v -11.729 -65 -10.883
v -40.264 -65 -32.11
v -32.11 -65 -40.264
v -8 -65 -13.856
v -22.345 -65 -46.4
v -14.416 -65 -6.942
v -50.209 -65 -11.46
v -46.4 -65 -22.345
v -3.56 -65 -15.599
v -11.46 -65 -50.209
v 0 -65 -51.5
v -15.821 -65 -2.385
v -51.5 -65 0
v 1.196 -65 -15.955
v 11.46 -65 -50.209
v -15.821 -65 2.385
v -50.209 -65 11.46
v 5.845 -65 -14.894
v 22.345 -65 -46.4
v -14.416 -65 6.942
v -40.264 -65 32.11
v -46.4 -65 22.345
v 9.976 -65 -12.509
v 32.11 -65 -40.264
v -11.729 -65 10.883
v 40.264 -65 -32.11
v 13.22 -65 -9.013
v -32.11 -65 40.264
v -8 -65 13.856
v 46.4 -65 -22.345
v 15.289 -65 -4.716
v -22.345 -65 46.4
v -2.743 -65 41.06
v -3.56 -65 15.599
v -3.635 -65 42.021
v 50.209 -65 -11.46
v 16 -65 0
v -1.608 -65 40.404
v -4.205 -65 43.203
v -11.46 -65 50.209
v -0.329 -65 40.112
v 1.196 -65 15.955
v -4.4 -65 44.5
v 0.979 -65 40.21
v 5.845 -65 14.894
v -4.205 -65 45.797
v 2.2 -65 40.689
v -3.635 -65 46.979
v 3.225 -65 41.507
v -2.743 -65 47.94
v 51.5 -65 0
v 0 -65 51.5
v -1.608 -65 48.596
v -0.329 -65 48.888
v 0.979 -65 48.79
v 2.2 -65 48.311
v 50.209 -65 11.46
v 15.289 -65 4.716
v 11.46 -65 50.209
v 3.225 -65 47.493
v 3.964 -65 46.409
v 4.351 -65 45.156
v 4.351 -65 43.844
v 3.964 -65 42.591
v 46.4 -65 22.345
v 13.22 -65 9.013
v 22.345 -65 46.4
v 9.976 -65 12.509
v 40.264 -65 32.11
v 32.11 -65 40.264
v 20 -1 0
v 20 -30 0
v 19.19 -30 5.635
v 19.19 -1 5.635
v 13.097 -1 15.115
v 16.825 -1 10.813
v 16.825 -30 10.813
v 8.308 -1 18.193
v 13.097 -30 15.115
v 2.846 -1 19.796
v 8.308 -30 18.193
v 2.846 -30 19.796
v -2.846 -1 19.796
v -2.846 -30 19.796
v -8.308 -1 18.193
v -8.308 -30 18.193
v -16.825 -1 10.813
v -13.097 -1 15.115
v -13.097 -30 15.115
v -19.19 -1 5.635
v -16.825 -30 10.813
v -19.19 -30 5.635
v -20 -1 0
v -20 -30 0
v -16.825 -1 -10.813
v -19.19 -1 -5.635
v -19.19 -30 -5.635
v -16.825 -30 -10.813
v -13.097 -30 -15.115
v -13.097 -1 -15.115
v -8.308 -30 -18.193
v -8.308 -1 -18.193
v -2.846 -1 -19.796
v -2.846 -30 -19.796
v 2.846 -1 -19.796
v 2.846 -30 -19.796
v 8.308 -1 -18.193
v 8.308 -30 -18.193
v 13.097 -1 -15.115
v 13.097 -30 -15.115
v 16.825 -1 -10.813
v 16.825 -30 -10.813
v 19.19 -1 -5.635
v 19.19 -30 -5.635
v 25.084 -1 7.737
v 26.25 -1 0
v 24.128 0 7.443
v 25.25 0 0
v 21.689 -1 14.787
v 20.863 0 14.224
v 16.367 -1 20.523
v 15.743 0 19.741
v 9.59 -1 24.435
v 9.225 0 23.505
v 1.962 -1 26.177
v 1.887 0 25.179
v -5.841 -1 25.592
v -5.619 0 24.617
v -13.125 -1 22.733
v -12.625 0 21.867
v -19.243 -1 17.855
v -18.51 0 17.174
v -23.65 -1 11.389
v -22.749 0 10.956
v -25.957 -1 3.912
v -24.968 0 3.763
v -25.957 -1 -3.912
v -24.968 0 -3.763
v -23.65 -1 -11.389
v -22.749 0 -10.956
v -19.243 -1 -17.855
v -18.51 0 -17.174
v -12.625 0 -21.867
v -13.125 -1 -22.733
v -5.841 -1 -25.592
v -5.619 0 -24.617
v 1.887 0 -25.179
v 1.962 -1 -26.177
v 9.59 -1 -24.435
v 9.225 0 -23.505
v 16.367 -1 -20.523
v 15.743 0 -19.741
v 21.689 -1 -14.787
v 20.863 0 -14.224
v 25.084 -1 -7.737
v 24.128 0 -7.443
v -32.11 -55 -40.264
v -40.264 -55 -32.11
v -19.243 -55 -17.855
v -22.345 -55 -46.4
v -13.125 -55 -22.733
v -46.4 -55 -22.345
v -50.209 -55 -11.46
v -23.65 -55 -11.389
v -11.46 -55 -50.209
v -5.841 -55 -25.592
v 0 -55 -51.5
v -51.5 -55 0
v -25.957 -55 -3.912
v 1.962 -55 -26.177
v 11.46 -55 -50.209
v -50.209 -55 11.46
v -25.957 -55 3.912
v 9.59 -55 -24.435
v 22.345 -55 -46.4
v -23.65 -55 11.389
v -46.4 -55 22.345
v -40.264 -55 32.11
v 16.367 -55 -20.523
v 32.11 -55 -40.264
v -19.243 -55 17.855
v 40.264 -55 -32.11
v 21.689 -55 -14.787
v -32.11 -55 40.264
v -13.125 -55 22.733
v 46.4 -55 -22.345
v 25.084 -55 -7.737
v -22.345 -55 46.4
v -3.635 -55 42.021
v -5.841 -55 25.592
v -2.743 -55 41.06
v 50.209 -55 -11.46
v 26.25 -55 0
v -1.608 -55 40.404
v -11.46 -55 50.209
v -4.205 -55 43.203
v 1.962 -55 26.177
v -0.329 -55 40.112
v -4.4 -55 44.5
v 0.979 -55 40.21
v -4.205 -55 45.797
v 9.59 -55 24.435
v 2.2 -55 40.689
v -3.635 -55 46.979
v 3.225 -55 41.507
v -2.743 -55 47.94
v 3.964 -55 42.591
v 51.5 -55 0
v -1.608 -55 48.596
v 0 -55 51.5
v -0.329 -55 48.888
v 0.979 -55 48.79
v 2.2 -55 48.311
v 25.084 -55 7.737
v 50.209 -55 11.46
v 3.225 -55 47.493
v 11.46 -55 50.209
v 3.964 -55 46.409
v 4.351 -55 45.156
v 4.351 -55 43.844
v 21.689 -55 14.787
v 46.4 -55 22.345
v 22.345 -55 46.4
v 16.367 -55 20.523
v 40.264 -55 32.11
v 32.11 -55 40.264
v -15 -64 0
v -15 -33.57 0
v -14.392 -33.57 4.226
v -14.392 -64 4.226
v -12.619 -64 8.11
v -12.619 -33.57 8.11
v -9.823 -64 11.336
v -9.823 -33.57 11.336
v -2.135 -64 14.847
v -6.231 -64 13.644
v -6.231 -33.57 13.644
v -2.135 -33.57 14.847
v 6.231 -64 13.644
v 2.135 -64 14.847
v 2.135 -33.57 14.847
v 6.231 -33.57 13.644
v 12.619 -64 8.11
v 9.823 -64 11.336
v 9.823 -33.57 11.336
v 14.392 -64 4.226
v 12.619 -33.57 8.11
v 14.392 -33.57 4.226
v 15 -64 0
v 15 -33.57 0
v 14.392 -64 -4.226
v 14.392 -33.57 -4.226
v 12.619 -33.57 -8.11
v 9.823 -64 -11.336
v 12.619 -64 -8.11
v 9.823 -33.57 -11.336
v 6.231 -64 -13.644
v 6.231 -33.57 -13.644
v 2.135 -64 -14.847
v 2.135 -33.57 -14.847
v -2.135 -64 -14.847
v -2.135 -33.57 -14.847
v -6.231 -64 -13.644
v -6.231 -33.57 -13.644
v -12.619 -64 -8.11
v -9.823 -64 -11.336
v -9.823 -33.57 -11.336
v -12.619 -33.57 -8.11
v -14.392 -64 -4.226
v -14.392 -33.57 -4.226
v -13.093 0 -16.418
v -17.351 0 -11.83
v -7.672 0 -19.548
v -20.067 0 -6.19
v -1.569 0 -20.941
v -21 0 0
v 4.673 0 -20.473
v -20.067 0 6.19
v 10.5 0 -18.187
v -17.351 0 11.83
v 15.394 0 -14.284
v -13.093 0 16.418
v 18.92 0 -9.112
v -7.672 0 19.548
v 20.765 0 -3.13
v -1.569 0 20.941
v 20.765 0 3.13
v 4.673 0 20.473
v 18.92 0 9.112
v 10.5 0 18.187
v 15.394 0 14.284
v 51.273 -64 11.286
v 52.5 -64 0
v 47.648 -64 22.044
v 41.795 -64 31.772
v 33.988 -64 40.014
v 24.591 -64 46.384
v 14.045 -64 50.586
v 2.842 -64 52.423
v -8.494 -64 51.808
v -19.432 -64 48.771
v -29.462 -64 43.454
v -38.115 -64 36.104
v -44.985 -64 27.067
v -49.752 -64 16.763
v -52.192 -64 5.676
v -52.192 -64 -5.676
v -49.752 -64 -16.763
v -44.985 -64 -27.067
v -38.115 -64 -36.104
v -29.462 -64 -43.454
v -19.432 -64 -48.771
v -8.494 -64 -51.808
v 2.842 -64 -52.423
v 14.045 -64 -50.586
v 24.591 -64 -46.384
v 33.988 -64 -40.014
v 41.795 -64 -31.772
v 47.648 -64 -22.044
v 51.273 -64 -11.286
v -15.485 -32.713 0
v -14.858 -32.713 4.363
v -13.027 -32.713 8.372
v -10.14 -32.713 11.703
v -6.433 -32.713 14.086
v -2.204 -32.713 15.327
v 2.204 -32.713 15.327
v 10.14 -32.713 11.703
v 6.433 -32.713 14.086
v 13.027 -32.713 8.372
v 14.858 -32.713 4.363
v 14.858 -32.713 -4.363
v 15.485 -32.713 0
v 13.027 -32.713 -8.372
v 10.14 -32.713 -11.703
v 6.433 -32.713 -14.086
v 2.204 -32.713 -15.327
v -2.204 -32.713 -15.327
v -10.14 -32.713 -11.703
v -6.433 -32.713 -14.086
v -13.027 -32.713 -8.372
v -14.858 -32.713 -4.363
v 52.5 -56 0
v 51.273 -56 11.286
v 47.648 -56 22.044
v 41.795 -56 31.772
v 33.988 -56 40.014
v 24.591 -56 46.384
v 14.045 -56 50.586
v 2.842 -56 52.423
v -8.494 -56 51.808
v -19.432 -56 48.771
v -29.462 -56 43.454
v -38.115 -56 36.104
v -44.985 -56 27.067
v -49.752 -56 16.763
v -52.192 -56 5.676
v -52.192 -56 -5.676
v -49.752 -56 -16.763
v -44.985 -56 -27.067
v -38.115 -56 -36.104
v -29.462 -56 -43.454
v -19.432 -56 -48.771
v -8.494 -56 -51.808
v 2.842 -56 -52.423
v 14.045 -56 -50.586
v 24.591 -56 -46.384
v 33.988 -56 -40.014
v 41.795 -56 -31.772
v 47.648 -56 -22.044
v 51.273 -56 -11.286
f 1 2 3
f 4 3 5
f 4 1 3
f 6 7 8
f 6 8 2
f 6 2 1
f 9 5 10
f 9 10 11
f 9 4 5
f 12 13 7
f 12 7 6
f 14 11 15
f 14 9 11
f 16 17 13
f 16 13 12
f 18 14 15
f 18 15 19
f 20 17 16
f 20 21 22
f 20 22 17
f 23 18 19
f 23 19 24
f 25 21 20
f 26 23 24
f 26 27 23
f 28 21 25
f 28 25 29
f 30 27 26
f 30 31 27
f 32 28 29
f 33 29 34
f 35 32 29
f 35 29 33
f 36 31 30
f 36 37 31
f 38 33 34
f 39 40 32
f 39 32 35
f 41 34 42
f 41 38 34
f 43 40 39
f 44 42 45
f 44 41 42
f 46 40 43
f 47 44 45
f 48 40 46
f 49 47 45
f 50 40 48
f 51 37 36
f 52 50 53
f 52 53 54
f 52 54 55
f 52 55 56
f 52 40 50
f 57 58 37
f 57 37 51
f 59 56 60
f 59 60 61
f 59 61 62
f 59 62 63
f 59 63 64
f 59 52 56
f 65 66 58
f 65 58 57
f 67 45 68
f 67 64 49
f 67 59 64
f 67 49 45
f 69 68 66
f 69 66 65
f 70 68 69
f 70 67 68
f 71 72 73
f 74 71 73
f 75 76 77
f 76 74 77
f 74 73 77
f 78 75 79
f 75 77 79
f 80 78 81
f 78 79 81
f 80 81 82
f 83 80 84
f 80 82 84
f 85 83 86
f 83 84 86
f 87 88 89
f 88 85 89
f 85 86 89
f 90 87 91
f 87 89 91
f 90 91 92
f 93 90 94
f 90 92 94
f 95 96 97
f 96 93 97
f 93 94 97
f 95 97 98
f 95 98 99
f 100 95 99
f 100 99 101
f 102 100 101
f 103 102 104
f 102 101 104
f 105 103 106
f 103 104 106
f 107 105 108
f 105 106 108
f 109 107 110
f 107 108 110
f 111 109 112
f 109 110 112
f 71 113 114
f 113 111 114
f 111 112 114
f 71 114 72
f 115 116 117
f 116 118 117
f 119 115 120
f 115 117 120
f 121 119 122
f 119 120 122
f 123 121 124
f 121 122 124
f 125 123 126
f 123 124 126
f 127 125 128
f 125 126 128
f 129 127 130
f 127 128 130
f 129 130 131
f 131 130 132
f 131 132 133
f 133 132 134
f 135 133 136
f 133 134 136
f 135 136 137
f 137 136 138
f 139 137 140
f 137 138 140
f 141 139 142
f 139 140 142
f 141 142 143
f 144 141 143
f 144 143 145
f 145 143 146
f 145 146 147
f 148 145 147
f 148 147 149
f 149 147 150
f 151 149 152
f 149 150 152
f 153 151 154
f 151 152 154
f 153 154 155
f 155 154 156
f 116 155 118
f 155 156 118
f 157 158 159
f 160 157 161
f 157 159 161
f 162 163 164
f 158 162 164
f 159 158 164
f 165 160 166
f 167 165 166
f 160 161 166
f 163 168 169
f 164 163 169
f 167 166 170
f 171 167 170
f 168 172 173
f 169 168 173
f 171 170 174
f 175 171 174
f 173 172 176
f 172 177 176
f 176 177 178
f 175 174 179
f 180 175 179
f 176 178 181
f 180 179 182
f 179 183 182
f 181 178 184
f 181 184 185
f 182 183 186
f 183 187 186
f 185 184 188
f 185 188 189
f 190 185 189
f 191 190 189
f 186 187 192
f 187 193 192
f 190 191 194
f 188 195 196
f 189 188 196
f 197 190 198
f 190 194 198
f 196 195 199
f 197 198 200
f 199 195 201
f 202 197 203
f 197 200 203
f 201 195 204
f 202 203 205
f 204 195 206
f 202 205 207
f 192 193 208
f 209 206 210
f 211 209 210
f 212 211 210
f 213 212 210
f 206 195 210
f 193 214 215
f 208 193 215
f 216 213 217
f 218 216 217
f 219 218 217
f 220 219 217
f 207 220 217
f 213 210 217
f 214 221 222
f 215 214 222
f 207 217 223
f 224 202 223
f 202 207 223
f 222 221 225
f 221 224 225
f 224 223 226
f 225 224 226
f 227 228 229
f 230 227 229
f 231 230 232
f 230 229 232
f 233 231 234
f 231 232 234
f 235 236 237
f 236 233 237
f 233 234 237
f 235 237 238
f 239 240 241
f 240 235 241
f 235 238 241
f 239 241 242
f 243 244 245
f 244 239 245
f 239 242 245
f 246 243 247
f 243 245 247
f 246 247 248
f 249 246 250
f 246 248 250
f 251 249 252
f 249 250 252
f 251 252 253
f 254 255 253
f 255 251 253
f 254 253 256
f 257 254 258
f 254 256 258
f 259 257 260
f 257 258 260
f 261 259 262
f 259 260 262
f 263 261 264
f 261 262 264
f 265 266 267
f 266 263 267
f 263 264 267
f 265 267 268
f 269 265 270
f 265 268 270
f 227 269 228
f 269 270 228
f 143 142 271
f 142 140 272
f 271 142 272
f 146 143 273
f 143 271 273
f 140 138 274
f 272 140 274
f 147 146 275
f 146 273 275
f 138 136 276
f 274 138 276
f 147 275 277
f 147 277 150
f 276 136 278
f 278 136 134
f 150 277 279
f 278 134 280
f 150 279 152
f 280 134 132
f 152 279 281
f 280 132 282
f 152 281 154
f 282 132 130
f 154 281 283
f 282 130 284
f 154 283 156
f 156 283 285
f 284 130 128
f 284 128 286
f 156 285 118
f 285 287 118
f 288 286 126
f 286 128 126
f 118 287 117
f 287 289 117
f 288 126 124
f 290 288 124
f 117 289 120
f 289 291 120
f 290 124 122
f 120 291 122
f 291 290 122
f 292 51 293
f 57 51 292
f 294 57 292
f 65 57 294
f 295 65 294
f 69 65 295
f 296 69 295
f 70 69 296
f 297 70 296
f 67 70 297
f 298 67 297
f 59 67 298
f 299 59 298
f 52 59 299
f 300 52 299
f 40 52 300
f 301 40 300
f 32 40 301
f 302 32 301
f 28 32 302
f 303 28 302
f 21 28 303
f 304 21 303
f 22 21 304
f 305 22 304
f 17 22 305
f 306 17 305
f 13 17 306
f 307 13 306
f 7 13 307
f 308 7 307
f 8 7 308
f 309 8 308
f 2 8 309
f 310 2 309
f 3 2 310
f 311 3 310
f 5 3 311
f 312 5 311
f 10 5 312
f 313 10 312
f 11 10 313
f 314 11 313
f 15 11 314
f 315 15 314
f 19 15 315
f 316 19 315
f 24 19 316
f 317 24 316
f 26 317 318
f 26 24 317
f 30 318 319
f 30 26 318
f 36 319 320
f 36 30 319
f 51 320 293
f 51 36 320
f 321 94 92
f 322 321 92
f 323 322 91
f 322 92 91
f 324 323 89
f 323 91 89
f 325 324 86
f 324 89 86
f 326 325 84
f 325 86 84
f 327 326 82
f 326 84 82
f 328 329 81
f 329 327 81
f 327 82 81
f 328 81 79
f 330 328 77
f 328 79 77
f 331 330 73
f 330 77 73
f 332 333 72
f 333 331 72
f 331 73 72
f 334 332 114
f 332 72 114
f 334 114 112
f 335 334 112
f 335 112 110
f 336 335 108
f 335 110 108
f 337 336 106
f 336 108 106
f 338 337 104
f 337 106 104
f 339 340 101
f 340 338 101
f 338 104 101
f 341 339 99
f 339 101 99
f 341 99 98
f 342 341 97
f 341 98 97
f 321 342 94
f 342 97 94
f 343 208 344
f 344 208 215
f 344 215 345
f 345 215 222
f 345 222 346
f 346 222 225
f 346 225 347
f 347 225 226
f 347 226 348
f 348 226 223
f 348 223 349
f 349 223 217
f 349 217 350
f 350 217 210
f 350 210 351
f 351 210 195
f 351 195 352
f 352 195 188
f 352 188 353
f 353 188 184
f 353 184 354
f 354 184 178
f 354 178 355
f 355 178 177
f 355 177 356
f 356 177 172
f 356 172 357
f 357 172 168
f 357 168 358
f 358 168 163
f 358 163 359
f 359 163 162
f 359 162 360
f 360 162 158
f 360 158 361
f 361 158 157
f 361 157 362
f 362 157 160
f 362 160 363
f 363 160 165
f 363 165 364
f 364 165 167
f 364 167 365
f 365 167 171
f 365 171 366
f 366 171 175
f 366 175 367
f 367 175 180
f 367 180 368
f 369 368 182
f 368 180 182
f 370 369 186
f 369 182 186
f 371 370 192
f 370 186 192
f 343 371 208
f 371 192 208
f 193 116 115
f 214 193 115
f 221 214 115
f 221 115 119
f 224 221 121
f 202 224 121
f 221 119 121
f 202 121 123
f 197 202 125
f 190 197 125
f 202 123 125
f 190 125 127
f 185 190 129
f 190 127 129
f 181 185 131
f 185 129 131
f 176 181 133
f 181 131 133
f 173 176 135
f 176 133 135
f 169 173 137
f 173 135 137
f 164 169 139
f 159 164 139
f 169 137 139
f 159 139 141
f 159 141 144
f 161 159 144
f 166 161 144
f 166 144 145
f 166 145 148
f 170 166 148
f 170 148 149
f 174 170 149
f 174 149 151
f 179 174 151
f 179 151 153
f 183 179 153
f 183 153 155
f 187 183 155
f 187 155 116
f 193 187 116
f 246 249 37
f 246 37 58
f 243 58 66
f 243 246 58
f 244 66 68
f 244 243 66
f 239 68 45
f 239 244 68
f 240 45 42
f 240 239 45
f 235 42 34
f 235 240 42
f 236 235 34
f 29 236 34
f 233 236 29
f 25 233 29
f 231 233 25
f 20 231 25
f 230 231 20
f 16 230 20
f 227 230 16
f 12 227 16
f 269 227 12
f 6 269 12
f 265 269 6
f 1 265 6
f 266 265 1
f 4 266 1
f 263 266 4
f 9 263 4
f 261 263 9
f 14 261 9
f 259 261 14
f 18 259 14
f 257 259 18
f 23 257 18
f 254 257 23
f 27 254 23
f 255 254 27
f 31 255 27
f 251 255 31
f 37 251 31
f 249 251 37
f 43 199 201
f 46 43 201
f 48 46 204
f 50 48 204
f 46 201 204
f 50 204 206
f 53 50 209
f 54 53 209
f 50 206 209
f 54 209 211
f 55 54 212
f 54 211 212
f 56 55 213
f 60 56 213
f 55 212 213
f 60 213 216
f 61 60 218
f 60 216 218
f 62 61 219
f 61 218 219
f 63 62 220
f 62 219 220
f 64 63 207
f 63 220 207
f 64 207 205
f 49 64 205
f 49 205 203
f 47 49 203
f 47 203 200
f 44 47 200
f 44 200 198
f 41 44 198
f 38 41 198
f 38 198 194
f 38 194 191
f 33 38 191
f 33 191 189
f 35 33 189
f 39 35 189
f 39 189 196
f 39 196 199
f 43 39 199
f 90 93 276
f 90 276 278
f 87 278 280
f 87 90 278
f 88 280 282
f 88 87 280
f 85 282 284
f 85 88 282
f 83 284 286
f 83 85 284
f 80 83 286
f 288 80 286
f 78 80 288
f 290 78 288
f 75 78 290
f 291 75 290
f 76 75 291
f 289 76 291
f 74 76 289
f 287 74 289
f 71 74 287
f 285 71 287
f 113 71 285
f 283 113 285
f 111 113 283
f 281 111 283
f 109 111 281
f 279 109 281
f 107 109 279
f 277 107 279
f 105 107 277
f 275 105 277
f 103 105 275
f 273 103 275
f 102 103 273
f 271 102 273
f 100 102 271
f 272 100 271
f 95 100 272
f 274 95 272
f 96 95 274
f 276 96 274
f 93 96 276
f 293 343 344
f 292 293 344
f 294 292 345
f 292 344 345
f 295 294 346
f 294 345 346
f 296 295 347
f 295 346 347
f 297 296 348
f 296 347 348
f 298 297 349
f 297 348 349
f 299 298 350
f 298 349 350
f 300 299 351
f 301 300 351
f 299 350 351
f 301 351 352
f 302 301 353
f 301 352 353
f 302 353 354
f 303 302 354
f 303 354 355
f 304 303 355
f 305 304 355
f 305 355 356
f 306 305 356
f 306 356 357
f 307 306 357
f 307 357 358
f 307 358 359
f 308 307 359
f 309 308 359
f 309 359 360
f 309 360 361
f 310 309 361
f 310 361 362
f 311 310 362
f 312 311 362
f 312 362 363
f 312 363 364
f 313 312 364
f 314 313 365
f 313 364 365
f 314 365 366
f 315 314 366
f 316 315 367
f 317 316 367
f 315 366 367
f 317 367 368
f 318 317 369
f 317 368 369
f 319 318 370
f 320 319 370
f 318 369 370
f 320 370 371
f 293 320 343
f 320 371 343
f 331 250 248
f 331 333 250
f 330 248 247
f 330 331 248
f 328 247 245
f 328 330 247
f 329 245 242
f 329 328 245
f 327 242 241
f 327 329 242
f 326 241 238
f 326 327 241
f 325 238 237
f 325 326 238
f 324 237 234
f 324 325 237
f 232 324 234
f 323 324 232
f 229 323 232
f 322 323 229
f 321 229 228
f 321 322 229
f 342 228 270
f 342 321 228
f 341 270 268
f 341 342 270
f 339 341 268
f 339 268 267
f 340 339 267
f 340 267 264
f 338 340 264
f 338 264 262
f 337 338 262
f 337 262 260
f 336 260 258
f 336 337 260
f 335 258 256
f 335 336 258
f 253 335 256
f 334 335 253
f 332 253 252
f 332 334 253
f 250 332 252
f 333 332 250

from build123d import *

# Parameters (mm, degrees)
F0_R         = 26.25
F1_DEPTH     = 55
F2_R         = 52.5
F2_R_2       = 26.25
F3_DEPTH     = 10
F6_D         = 30
F6_DEPTH     = 40
F6_TIP       = 9.0129092854
F7_D         = 40
F7_DEPTH     = 30
F7_TIP       = 12.0172123806
F8_T10_ANGLE = 180
F8_T12_ANGLE = 180
F10_D        = 8.8


# Not quite as in the source:
# - a fillet or chamfer that OpenCascade refuses, or shapes differently, is made with other operations: its cross-section is extruded or revolved along the edge and cut away or added


with BuildPart() as f1:
    # F0 (on Front) → F1 (new body)
    with BuildSketch(Plane.XZ):
        Circle(F0_R)
    extrude(amount=F1_DEPTH)

    # F2 (on face) → F3 (join)
    with BuildSketch(Plane.XZ.offset(55)):
        Circle(F2_R)
        Circle(F2_R_2, mode=Mode.SUBTRACT)
        Circle(F2_R_2)
    extrude(amount=F3_DEPTH)

    # F6
    with Locations(Plane.XZ.offset(65)):
        with Locations((0, 0)):
            Hole(F6_D / 2, depth=F6_DEPTH)
            with Locations((0, 0, -(F6_DEPTH + F6_TIP / 2))):  # 118° drill point
                Cone(0, F6_D / 2, F6_TIP, mode=Mode.SUBTRACT)

    # F7
    with Locations(Plane(origin=(0, 0, 0), x_dir=(-1, 0, 0), z_dir=(0, 1, 0))):
        with Locations((0, 0)):
            Hole(F7_D / 2, depth=F7_DEPTH)
            with Locations((0, 0, -(F7_DEPTH + F7_TIP / 2))):  # 118° drill point
                Cone(0, F7_D / 2, F7_TIP, mode=Mode.SUBTRACT)

    # F8: chamfer of 1 on 7 edges, made by hand

    # F8_s1 → F8_t2 (revolve, cut)
    with BuildSketch(Plane.XY):
        Polygon((52.5, -56), (51.5, -55), (52.5, -55), align=None)
    revolve(axis=Axis((0, -55, 0), (0, -1, 0)), mode=Mode.SUBTRACT)

    # F8_s3 → F8_t4 (revolve, cut)
    with BuildSketch(Plane.XY):
        Polygon((26.25, -1), (25.25, 0), (26.25, 0), align=None)
    revolve(axis=Axis((0, 0, 0), (0, -1, 0)), mode=Mode.SUBTRACT)

    # F8_s5 → F8_t6 (revolve, cut)
    with BuildSketch(Plane.XY):
        Polygon((52.5, -64), (51.5, -65), (52.5, -65), align=None)
    revolve(axis=Axis((0, -65, 0), (0, -1, 0)), mode=Mode.SUBTRACT)

    # F8_s7 → F8_t8 (revolve, cut)
    with BuildSketch(Plane.XY):
        Polygon((16, -65), (15, -64), (15, -65), align=None)
    revolve(axis=Axis((0, -65, 0), (0, -1, 0)), mode=Mode.SUBTRACT)

    # F8_s9 → F8_t10 (revolve, cut)
    with BuildSketch(Plane.XY):
        Polygon((-15, -33.5700758733), (-15.4849619251, -32.7129085726), (-15, -33.0043030951), align=None)
    revolve(axis=Axis((0, -33.0043030951, 0), (0, -1, 0)), revolution_arc=F8_T10_ANGLE, mode=Mode.SUBTRACT)

    # F8_s11 → F8_t12 (revolve, cut)
    with BuildSketch(Plane.XY):
        Polygon((15, -33.5700758733), (15.4849619251, -32.7129085726), (15, -33.0043030951), align=None)
    revolve(axis=Axis((0, -33.0043030951, 0), (0, -1, 0)), revolution_arc=F8_T12_ANGLE, mode=Mode.SUBTRACT)

    # F8_s13 → F8_t14 (revolve, cut)
    with BuildSketch(Plane.XY):
        Polygon((-21, 0), (-20, -1), (-20, 0), align=None)
    revolve(axis=Axis((0, 0, 0), (0, 1, 0)), mode=Mode.SUBTRACT)

    # F10 (through all)
    with Locations(Plane.XZ.offset(65)):
        with Locations((0, 44.5)):
            Hole(F10_D / 2)


solid = f1.part
